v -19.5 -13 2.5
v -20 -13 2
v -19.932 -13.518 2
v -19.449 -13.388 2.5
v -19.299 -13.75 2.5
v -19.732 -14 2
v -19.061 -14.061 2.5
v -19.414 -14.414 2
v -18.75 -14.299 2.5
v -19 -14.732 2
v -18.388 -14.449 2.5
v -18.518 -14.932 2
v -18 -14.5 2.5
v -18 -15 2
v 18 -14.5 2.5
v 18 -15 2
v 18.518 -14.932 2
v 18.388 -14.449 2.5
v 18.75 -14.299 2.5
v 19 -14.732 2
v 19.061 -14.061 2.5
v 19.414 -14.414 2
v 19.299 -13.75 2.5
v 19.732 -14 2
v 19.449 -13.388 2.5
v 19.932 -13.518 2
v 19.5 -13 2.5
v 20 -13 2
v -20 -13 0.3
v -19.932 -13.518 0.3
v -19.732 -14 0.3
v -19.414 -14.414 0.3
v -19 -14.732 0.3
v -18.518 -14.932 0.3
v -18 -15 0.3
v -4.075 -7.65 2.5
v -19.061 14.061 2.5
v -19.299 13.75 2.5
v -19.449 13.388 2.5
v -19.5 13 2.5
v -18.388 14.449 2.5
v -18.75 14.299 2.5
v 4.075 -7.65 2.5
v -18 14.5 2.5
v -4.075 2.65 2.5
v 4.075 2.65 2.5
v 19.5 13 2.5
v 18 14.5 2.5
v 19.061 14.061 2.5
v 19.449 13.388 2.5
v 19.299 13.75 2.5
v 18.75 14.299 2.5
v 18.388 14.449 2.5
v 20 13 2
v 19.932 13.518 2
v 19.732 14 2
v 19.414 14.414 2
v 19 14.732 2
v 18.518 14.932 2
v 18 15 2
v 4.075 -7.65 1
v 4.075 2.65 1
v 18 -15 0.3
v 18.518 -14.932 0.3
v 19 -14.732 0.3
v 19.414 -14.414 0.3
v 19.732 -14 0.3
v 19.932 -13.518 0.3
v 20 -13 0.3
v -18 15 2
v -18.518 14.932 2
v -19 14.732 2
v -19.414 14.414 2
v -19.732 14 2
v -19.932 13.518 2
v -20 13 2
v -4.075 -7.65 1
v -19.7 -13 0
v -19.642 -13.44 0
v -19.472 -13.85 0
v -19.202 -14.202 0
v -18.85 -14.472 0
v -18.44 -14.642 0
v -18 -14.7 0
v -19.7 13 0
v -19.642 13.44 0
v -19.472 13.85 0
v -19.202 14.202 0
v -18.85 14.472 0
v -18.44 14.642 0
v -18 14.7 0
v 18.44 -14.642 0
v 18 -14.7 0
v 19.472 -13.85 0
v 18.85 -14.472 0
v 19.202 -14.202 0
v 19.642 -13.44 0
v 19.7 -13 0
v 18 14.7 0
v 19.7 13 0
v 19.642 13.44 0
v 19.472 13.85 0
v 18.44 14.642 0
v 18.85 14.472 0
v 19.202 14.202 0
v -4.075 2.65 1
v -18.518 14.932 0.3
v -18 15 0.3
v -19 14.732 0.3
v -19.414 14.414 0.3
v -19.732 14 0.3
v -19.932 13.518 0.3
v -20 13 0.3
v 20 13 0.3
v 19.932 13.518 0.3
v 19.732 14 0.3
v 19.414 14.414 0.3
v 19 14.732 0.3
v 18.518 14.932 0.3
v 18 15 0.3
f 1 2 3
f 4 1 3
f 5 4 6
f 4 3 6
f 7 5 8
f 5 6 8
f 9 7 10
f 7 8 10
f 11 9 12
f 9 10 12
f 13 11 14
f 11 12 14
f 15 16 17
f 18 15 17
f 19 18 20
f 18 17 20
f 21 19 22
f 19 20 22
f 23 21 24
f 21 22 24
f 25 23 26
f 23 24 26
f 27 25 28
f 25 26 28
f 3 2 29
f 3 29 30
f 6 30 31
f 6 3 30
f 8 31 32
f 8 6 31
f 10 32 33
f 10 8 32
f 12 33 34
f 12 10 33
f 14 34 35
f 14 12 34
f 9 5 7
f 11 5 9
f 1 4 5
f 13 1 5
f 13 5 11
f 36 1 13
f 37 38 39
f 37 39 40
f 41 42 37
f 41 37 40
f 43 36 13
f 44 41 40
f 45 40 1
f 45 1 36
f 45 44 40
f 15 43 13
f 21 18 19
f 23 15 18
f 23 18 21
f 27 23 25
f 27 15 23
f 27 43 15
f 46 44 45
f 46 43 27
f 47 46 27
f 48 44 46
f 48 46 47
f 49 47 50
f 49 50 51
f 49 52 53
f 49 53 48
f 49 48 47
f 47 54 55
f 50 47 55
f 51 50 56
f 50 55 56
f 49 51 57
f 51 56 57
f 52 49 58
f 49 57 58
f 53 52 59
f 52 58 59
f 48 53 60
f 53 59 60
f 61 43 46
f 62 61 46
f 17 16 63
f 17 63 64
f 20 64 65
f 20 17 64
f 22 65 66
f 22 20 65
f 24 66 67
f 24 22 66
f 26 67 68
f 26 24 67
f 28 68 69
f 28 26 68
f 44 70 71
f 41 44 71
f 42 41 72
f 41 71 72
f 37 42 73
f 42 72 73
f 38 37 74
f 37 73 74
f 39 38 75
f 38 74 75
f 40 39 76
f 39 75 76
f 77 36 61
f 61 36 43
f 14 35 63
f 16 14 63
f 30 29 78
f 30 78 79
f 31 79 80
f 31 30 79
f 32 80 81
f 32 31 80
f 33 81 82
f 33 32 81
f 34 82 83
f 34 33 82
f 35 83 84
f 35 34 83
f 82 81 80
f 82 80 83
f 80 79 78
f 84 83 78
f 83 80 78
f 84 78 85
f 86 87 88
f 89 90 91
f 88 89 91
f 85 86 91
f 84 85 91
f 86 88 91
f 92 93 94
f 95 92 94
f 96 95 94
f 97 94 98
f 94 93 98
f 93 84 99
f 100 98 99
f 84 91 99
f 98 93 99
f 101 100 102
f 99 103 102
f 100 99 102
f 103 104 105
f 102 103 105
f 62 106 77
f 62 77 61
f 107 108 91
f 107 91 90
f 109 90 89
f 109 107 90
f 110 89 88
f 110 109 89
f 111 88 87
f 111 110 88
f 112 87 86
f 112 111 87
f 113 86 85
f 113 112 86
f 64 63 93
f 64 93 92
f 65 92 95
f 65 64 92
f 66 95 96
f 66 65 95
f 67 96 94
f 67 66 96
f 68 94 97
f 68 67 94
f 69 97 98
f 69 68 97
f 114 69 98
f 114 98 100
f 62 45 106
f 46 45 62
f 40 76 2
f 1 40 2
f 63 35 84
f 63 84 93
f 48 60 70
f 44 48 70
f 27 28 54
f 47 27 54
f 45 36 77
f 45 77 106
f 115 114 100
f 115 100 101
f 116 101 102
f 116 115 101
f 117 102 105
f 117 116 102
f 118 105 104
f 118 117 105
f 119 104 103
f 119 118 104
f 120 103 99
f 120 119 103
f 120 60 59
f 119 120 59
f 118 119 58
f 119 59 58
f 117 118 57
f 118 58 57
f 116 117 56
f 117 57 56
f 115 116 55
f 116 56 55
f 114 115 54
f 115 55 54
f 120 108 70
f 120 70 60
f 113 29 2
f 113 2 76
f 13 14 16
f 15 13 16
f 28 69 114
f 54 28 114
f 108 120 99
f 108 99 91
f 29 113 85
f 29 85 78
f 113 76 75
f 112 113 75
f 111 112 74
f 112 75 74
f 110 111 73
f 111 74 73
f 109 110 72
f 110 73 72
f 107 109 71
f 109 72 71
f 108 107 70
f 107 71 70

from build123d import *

# Parameters (mm, degrees)
SKETCH1_W           = 40
SKETCH1_H           = 30
BOSS_EXTRUDE1_DEPTH = 2.5
SKETCH2_W           = 8.15
SKETCH2_H           = 10.3
CUT_EXTRUDE1_DEPTH  = 1.5
FILLET1_R           = 2
CHAMFER1_SIZE       = 0.5
CHAMFER2_SIZE       = 0.3


with BuildPart() as part:
    # Sketch1 → Boss-Extrude1 (new body)
    with BuildSketch(Plane.XY):
        Rectangle(SKETCH1_W, SKETCH1_H)
    extrude(amount=BOSS_EXTRUDE1_DEPTH)

    # Sketch2 → Cut-Extrude1 (cut)
    with BuildSketch(Plane.XY.offset(2.5)):
        with Locations((0, -2.5)):
            Rectangle(SKETCH2_W, SKETCH2_H)
    extrude(amount=-CUT_EXTRUDE1_DEPTH, mode=Mode.SUBTRACT)

    # Fillet1
    fillet1_edges = [part.edges().sort_by_distance(p)[0] for p in [
        (20, -15, 1.25),
        (-20, -15, 1.25),
        (-20, 15, 1.25),
        (20, 15, 1.25),
    ]]
    fillet(fillet1_edges, radius=FILLET1_R)

    # Chamfer1
    chamfer1_edges = [part.edges().sort_by_distance(p)[0] for p in [
        (0, -15, 2.5),
        (-20, 0, 2.5),
        (20, 0, 2.5),
        (0, 15, 2.5),
        (19.414213562, 14.414213562, 2.5),
        (-19.414213562, 14.414213562, 2.5),
        (19.414213562, -14.414213562, 2.5),
        (-19.414213562, -14.414213562, 2.5),
    ]]
    chamfer(chamfer1_edges, length=CHAMFER1_SIZE)

    # Chamfer2
    chamfer2_edges = [part.edges().sort_by_distance(p)[0] for p in [
        (0, -15, 0),
        (20, 0, 0),
        (-20, 0, 0),
        (0, 15, 0),
        (19.414213562, 14.414213562, 0),
        (-19.414213562, 14.414213562, 0),
        (19.414213562, -14.414213562, 0),
        (-19.414213562, -14.414213562, 0),
    ]]
    chamfer(chamfer2_edges, length=CHAMFER2_SIZE)


solid = part.part
